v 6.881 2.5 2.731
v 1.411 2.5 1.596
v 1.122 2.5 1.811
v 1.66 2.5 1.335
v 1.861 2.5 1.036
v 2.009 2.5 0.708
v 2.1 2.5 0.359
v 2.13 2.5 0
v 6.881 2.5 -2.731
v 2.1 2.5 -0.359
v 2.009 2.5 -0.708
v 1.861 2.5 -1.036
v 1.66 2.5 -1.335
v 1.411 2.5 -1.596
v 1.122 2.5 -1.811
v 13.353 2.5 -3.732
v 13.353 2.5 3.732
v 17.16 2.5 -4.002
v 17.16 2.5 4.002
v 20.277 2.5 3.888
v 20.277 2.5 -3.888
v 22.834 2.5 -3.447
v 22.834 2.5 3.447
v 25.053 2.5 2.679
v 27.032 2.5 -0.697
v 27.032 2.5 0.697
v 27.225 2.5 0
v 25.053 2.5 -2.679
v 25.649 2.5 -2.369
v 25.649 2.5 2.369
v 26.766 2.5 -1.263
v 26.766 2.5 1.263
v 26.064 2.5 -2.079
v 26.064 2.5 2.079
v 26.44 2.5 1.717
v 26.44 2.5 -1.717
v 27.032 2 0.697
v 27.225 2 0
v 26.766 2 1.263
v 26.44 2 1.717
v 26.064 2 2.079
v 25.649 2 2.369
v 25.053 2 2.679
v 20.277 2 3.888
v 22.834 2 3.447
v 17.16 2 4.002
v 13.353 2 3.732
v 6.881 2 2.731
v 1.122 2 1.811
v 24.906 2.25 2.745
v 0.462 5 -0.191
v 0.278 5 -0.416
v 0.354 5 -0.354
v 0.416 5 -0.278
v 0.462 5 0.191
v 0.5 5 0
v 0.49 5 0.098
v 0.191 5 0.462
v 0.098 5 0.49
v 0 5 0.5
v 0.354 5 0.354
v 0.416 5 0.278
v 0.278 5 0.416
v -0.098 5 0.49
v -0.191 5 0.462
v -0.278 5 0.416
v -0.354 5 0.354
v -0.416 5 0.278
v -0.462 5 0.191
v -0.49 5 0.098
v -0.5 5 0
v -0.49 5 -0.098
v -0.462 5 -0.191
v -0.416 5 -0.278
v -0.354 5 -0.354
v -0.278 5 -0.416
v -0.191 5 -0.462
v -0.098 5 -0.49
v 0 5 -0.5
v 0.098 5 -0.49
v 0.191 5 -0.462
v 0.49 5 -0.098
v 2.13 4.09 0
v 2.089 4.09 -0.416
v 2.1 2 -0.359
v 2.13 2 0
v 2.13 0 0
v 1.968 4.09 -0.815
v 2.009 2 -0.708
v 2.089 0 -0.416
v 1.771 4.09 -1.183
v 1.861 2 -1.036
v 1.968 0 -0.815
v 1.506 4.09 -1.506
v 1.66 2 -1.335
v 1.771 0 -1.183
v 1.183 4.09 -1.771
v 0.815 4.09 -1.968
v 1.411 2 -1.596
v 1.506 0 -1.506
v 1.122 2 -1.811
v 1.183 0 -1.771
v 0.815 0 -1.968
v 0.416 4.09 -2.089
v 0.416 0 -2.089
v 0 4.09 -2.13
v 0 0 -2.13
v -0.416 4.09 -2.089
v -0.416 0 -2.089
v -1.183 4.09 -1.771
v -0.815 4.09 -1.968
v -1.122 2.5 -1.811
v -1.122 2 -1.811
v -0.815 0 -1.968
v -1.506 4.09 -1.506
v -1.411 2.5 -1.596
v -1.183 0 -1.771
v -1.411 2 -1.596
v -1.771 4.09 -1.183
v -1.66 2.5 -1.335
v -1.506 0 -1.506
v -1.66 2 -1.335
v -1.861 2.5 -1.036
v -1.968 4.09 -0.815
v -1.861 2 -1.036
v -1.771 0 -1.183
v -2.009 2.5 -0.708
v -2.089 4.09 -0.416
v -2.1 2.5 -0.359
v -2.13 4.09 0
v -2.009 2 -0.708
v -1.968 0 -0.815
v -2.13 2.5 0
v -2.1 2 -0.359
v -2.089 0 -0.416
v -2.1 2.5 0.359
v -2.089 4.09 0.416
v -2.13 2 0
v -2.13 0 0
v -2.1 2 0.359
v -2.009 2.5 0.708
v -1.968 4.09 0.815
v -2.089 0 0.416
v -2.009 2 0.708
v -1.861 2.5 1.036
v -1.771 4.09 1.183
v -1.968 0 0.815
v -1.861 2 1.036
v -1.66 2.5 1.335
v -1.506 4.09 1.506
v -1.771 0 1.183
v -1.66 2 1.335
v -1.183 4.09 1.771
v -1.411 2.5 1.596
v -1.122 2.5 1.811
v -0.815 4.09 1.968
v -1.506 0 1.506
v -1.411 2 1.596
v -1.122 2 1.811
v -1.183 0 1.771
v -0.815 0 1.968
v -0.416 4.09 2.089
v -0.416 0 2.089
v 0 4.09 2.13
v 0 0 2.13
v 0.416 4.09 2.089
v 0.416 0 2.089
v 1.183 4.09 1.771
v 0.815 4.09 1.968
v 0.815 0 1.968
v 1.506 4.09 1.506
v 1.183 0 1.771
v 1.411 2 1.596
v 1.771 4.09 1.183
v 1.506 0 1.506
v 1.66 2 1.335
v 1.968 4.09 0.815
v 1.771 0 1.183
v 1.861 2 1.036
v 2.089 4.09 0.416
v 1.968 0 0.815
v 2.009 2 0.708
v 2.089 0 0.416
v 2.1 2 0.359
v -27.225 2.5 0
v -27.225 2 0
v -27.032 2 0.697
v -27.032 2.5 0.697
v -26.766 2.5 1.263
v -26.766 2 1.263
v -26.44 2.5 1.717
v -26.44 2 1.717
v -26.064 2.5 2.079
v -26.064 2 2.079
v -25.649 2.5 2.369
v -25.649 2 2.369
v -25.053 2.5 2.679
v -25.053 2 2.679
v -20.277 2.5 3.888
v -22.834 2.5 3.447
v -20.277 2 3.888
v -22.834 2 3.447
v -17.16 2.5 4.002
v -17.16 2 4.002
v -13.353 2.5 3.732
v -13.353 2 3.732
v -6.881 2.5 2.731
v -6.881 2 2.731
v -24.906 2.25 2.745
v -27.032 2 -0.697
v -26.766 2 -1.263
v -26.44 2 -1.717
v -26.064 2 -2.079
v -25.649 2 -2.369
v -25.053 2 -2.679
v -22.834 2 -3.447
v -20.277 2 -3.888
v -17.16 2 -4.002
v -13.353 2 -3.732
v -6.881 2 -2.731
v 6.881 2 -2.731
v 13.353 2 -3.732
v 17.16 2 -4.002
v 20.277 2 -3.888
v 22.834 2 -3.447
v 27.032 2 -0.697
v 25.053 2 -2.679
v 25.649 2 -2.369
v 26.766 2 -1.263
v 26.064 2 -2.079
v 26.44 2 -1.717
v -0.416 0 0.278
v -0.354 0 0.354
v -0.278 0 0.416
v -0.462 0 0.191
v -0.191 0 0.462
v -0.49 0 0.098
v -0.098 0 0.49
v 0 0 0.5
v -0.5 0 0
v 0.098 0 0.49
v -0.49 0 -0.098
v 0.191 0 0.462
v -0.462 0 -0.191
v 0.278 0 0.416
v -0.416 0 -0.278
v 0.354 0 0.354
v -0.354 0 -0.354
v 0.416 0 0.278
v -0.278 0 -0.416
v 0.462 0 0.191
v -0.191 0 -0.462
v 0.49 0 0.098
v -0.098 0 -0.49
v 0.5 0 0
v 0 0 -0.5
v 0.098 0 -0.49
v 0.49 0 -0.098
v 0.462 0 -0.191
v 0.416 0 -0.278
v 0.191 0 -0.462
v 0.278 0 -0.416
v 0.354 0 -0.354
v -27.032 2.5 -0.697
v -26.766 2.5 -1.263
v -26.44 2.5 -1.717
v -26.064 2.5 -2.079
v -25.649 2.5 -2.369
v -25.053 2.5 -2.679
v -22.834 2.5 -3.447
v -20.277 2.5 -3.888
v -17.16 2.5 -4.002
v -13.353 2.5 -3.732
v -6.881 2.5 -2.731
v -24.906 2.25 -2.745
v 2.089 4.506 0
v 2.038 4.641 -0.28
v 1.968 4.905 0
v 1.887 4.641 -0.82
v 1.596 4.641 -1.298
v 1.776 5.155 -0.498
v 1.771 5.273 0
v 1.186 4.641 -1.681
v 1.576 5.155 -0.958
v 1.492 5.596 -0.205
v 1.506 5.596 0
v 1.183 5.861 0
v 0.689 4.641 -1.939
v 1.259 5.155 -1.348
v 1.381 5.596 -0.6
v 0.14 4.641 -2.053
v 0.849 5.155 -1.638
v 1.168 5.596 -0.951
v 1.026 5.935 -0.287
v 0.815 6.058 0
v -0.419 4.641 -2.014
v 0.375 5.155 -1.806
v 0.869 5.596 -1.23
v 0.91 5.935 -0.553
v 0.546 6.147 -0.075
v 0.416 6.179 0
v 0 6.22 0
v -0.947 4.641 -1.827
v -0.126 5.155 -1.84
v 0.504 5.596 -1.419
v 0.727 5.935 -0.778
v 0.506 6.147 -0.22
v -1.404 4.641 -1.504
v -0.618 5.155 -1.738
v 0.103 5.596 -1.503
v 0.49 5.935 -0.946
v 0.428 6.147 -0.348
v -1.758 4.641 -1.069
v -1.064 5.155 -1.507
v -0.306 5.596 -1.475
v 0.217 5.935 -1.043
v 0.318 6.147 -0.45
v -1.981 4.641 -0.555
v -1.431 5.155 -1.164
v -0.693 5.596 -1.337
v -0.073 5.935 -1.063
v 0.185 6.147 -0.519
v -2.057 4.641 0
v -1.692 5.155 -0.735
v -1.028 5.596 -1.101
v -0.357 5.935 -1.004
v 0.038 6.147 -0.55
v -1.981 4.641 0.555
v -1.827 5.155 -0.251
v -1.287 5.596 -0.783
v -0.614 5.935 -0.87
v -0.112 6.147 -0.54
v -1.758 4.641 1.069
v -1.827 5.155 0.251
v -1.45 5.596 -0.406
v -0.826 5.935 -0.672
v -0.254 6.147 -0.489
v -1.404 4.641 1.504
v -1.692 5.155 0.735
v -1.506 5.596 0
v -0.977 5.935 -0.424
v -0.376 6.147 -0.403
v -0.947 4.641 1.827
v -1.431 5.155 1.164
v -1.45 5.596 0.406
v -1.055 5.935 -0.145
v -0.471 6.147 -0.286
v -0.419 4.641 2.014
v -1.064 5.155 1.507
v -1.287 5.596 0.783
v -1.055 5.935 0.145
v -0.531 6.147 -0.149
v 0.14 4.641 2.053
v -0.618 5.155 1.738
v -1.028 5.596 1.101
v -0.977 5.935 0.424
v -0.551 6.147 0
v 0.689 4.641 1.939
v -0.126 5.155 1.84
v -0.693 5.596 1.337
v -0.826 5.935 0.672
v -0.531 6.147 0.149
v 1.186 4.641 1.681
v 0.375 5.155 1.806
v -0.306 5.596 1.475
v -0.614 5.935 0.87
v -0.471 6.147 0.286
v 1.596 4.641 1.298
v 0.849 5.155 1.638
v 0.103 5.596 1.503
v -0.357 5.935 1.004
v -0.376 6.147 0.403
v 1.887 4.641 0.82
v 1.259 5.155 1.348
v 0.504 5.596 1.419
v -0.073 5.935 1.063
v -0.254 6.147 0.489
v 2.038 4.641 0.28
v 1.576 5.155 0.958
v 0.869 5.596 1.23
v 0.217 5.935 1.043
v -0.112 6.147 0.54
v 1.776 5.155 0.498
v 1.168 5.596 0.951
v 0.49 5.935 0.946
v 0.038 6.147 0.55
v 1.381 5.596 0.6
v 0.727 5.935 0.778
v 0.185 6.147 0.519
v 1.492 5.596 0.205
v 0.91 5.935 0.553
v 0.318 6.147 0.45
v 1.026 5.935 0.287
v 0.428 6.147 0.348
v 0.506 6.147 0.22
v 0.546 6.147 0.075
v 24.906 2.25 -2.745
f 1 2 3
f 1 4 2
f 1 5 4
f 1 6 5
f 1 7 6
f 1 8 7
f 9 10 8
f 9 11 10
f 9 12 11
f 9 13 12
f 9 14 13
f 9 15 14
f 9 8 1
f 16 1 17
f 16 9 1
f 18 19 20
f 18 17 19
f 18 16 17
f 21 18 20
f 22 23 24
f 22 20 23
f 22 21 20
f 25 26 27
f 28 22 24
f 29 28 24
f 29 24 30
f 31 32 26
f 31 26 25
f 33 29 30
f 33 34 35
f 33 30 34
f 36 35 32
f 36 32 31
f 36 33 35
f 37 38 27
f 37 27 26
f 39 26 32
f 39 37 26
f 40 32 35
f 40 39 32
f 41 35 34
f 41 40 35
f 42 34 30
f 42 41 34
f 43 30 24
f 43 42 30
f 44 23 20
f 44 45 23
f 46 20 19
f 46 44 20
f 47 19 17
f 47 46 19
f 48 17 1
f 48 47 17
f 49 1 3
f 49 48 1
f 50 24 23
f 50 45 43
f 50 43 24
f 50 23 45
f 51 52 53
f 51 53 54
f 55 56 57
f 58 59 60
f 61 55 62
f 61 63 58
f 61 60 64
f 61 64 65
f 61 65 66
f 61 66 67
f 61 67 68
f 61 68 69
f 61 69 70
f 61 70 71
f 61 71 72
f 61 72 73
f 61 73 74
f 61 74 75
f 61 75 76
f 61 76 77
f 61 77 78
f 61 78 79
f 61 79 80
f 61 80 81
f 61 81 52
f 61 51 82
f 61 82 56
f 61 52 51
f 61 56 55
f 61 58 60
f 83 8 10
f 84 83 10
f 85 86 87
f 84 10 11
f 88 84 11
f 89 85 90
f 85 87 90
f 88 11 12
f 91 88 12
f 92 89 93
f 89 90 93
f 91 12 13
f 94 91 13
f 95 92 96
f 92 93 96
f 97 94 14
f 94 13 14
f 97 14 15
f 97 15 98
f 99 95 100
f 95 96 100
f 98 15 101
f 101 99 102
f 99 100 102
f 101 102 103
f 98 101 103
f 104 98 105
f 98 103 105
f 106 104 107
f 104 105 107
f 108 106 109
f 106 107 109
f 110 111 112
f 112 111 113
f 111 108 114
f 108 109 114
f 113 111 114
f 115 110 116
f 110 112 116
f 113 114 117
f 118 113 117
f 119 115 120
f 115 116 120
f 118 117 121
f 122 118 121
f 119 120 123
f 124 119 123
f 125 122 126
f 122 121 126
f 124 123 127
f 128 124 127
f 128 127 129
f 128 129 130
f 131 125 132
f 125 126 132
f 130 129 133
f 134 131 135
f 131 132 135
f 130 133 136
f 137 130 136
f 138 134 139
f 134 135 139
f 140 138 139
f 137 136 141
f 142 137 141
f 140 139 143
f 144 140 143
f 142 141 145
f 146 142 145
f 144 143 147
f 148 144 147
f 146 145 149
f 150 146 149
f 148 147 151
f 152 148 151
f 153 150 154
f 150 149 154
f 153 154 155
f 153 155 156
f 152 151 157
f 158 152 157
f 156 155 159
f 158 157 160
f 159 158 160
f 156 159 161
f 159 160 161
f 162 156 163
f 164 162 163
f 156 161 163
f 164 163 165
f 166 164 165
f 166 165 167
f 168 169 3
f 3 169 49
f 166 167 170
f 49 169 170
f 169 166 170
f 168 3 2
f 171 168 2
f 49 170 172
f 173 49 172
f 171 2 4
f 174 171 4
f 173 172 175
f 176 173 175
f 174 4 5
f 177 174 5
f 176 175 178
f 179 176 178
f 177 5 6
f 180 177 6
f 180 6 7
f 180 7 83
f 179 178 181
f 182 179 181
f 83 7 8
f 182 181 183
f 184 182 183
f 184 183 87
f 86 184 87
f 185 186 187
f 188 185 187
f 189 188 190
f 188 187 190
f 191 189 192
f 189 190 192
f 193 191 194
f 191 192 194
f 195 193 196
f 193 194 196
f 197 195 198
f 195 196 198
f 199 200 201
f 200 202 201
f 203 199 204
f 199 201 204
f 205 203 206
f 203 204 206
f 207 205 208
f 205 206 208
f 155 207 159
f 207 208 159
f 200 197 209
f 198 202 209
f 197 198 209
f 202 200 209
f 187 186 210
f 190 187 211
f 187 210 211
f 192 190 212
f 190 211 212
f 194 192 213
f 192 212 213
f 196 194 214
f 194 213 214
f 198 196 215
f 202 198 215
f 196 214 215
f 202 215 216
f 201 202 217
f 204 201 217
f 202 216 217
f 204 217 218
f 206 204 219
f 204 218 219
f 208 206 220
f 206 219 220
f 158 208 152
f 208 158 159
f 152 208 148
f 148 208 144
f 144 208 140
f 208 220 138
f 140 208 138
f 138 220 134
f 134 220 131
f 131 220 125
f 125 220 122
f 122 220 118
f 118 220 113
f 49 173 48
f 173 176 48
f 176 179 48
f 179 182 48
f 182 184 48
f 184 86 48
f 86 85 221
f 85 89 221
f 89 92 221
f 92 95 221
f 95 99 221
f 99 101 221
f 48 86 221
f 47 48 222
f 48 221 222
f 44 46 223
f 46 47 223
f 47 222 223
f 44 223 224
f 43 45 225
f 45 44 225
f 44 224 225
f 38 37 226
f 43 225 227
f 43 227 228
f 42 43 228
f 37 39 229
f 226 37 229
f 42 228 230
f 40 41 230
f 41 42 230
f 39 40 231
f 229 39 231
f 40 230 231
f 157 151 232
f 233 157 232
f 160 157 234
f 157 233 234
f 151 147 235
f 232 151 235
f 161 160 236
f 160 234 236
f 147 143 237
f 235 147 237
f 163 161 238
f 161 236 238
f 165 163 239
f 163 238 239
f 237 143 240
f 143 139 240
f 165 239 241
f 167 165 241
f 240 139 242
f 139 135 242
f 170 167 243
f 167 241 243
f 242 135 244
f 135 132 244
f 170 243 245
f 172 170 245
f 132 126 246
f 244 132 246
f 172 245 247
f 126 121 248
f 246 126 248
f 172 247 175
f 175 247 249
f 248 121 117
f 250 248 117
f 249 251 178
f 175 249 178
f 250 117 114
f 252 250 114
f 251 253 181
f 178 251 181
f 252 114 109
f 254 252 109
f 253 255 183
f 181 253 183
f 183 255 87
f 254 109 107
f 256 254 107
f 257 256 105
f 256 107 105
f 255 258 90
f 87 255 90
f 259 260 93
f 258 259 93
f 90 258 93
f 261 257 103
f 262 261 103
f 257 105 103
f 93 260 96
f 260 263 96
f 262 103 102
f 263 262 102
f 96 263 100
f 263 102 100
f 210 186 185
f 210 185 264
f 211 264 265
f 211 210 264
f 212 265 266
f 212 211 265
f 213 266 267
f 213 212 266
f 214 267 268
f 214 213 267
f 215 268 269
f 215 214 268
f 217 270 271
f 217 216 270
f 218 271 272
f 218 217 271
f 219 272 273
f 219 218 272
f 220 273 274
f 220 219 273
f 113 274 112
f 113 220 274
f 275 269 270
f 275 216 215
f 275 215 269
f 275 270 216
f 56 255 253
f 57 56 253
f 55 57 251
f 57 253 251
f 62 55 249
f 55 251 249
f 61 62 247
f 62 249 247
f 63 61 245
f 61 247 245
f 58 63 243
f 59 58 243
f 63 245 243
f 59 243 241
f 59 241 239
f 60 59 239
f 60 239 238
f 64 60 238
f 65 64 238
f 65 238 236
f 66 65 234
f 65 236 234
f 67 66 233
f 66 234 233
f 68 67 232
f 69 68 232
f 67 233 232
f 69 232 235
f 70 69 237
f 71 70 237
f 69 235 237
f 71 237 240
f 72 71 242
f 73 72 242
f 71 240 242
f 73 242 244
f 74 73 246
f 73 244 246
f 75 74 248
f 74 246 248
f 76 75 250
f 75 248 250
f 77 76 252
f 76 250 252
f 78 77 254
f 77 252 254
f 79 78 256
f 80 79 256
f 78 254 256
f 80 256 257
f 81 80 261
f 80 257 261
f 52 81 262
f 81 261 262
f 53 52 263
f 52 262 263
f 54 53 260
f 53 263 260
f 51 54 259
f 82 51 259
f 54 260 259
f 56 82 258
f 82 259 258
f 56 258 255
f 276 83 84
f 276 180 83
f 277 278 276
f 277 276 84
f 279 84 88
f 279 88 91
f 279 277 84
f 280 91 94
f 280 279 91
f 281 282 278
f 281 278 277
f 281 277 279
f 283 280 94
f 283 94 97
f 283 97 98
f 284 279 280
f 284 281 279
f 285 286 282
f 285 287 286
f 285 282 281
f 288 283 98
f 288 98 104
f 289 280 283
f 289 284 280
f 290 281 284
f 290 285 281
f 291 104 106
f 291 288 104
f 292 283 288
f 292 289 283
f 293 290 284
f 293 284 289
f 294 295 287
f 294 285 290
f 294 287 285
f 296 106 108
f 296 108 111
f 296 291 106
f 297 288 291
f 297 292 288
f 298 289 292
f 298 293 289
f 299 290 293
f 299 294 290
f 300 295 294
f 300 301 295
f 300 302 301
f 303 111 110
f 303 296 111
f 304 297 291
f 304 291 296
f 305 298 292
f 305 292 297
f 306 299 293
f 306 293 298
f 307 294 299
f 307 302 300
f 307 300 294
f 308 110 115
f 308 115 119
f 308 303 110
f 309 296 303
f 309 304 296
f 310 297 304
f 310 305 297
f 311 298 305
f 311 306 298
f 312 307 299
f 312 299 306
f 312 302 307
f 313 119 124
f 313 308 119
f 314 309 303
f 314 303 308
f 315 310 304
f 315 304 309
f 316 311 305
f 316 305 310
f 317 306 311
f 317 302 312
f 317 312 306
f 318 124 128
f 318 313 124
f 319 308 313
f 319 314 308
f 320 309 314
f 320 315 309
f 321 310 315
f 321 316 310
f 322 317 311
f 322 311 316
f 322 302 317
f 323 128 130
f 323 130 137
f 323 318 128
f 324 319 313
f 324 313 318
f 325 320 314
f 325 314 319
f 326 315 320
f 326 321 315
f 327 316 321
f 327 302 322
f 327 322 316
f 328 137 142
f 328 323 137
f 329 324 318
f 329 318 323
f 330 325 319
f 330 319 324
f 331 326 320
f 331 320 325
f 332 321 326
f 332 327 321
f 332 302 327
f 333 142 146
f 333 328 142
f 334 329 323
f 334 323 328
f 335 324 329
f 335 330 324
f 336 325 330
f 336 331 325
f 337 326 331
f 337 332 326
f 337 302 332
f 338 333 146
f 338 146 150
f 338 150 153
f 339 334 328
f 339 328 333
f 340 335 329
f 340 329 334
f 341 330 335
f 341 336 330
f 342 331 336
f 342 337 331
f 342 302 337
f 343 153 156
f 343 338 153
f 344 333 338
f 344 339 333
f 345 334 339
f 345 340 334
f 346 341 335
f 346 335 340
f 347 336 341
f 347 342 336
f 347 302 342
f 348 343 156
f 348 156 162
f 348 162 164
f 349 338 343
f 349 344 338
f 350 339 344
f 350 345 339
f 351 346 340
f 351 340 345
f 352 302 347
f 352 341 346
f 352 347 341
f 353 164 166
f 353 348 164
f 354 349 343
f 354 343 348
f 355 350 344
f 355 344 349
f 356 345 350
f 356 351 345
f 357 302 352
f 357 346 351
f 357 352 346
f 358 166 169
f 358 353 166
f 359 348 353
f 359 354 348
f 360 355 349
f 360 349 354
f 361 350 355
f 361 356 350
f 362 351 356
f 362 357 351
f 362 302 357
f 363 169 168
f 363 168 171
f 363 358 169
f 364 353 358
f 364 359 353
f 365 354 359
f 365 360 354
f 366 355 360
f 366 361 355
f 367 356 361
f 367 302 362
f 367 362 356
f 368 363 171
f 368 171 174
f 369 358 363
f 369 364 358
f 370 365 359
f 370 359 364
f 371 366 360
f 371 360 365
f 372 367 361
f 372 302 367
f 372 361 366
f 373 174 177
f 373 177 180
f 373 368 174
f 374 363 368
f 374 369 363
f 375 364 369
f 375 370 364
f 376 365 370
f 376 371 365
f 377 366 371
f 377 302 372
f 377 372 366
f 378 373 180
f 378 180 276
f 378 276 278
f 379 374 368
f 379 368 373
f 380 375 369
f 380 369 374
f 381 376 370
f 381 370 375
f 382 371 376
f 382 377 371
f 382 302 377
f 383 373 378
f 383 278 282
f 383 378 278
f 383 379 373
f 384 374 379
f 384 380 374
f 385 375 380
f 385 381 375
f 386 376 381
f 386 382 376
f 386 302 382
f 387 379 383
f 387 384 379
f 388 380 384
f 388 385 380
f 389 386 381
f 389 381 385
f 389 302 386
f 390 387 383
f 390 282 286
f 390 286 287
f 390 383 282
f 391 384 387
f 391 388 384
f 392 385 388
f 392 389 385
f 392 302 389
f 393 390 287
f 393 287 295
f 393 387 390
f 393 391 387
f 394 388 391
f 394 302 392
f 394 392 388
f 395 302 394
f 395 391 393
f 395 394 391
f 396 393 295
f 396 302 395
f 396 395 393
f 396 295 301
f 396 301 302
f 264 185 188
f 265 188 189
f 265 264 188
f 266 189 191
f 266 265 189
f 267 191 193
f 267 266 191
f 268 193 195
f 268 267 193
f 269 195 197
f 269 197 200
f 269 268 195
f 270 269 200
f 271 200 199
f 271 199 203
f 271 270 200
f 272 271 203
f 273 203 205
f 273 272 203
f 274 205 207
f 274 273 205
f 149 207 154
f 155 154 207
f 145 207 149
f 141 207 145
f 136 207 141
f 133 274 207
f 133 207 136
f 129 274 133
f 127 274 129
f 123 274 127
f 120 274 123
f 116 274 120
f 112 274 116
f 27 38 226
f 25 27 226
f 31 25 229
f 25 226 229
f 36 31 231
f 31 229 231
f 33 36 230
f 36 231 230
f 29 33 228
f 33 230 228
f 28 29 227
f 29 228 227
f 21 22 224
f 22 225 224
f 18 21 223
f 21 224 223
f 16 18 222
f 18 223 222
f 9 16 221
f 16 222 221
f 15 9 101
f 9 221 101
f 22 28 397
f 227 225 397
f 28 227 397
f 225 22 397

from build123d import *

# Parameters (mm, degrees)
SKETCH1_R           = 2.13
BOSS_EXTRUDE1_DEPTH = 6.22
SKETCH2_R           = 0.5
CUT_EXTRUDE1_DEPTH  = 5
FILLET1_R           = 2.13
BOSS_EXTRUDE2_DEPTH = 0.5


with BuildPart() as part:
    # Sketch1 → Boss-Extrude1 (new body)
    with BuildSketch(Plane(origin=(0, 0, 0), x_dir=(1, 0, 0), z_dir=(0, 1, 0))):
        Circle(SKETCH1_R)
    extrude(amount=BOSS_EXTRUDE1_DEPTH)

    # Sketch2 → Cut-Extrude1 (cut)
    with BuildSketch(Plane.XZ):
        Circle(SKETCH2_R)
    extrude(amount=-CUT_EXTRUDE1_DEPTH, mode=Mode.SUBTRACT)

    # Fillet1
    fillet1_edges = [part.edges().sort_by_distance(p)[0] for p in [
        (-2.13, 6.22, 0),
    ]]
    fillet(fillet1_edges, radius=FILLET1_R)

    # Sketch3 → Boss-Extrude2 (add)
    with BuildSketch(Plane(origin=(0, 2, 0), x_dir=(-1, 0, 0), z_dir=(0, -1, 0))):
        with BuildLine():
            add(Edge.make_bspline(
                [(27.225, 0), (26.883719926, -1.707588045), (19.590217869, -6.21812063), (7.79108972, -2.564670987), (1.121711894, -1.810707714)],
                knots=[0, 0, 0, 0, 0.130362346, 1, 1, 1, 1], degree=3))
            add(Edge.make_bspline(
                [(27.225, 0), (26.883719926, 1.707588045), (19.590217869, 6.21812063), (7.79108972, 2.564670987), (1.121711894, 1.810707714)],
                knots=[0, 0, 0, 0, 0.130362346, 1, 1, 1, 1], degree=3))
            ThreePointArc((1.121711894, 1.810707714), (1.860933413, 1.036256162), (2.13, 0))
            ThreePointArc((2.13, 0), (1.860933413, -1.036256162), (1.121711894, -1.810707714))
        make_face()
        with BuildLine():
            add(Edge.make_bspline(
                [(-27.225, 0), (-26.883719926, 1.707588045), (-19.590217869, 6.21812063), (-7.79108972, 2.564670987), (-1.121711894, 1.810707714)],
                knots=[0, 0, 0, 0, 0.130362346, 1, 1, 1, 1], degree=3))
            add(Edge.make_bspline(
                [(-27.225, 0), (-26.883719926, -1.707588045), (-19.590217869, -6.21812063), (-7.79108972, -2.564670987), (-1.121711894, -1.810707714)],
                knots=[0, 0, 0, 0, 0.130362346, 1, 1, 1, 1], degree=3))
            ThreePointArc((-1.121711894, -1.810707714), (-2.13, 0), (-1.121711894, 1.810707714))
        make_face()
    extrude(amount=-BOSS_EXTRUDE2_DEPTH)


solid = part.part
